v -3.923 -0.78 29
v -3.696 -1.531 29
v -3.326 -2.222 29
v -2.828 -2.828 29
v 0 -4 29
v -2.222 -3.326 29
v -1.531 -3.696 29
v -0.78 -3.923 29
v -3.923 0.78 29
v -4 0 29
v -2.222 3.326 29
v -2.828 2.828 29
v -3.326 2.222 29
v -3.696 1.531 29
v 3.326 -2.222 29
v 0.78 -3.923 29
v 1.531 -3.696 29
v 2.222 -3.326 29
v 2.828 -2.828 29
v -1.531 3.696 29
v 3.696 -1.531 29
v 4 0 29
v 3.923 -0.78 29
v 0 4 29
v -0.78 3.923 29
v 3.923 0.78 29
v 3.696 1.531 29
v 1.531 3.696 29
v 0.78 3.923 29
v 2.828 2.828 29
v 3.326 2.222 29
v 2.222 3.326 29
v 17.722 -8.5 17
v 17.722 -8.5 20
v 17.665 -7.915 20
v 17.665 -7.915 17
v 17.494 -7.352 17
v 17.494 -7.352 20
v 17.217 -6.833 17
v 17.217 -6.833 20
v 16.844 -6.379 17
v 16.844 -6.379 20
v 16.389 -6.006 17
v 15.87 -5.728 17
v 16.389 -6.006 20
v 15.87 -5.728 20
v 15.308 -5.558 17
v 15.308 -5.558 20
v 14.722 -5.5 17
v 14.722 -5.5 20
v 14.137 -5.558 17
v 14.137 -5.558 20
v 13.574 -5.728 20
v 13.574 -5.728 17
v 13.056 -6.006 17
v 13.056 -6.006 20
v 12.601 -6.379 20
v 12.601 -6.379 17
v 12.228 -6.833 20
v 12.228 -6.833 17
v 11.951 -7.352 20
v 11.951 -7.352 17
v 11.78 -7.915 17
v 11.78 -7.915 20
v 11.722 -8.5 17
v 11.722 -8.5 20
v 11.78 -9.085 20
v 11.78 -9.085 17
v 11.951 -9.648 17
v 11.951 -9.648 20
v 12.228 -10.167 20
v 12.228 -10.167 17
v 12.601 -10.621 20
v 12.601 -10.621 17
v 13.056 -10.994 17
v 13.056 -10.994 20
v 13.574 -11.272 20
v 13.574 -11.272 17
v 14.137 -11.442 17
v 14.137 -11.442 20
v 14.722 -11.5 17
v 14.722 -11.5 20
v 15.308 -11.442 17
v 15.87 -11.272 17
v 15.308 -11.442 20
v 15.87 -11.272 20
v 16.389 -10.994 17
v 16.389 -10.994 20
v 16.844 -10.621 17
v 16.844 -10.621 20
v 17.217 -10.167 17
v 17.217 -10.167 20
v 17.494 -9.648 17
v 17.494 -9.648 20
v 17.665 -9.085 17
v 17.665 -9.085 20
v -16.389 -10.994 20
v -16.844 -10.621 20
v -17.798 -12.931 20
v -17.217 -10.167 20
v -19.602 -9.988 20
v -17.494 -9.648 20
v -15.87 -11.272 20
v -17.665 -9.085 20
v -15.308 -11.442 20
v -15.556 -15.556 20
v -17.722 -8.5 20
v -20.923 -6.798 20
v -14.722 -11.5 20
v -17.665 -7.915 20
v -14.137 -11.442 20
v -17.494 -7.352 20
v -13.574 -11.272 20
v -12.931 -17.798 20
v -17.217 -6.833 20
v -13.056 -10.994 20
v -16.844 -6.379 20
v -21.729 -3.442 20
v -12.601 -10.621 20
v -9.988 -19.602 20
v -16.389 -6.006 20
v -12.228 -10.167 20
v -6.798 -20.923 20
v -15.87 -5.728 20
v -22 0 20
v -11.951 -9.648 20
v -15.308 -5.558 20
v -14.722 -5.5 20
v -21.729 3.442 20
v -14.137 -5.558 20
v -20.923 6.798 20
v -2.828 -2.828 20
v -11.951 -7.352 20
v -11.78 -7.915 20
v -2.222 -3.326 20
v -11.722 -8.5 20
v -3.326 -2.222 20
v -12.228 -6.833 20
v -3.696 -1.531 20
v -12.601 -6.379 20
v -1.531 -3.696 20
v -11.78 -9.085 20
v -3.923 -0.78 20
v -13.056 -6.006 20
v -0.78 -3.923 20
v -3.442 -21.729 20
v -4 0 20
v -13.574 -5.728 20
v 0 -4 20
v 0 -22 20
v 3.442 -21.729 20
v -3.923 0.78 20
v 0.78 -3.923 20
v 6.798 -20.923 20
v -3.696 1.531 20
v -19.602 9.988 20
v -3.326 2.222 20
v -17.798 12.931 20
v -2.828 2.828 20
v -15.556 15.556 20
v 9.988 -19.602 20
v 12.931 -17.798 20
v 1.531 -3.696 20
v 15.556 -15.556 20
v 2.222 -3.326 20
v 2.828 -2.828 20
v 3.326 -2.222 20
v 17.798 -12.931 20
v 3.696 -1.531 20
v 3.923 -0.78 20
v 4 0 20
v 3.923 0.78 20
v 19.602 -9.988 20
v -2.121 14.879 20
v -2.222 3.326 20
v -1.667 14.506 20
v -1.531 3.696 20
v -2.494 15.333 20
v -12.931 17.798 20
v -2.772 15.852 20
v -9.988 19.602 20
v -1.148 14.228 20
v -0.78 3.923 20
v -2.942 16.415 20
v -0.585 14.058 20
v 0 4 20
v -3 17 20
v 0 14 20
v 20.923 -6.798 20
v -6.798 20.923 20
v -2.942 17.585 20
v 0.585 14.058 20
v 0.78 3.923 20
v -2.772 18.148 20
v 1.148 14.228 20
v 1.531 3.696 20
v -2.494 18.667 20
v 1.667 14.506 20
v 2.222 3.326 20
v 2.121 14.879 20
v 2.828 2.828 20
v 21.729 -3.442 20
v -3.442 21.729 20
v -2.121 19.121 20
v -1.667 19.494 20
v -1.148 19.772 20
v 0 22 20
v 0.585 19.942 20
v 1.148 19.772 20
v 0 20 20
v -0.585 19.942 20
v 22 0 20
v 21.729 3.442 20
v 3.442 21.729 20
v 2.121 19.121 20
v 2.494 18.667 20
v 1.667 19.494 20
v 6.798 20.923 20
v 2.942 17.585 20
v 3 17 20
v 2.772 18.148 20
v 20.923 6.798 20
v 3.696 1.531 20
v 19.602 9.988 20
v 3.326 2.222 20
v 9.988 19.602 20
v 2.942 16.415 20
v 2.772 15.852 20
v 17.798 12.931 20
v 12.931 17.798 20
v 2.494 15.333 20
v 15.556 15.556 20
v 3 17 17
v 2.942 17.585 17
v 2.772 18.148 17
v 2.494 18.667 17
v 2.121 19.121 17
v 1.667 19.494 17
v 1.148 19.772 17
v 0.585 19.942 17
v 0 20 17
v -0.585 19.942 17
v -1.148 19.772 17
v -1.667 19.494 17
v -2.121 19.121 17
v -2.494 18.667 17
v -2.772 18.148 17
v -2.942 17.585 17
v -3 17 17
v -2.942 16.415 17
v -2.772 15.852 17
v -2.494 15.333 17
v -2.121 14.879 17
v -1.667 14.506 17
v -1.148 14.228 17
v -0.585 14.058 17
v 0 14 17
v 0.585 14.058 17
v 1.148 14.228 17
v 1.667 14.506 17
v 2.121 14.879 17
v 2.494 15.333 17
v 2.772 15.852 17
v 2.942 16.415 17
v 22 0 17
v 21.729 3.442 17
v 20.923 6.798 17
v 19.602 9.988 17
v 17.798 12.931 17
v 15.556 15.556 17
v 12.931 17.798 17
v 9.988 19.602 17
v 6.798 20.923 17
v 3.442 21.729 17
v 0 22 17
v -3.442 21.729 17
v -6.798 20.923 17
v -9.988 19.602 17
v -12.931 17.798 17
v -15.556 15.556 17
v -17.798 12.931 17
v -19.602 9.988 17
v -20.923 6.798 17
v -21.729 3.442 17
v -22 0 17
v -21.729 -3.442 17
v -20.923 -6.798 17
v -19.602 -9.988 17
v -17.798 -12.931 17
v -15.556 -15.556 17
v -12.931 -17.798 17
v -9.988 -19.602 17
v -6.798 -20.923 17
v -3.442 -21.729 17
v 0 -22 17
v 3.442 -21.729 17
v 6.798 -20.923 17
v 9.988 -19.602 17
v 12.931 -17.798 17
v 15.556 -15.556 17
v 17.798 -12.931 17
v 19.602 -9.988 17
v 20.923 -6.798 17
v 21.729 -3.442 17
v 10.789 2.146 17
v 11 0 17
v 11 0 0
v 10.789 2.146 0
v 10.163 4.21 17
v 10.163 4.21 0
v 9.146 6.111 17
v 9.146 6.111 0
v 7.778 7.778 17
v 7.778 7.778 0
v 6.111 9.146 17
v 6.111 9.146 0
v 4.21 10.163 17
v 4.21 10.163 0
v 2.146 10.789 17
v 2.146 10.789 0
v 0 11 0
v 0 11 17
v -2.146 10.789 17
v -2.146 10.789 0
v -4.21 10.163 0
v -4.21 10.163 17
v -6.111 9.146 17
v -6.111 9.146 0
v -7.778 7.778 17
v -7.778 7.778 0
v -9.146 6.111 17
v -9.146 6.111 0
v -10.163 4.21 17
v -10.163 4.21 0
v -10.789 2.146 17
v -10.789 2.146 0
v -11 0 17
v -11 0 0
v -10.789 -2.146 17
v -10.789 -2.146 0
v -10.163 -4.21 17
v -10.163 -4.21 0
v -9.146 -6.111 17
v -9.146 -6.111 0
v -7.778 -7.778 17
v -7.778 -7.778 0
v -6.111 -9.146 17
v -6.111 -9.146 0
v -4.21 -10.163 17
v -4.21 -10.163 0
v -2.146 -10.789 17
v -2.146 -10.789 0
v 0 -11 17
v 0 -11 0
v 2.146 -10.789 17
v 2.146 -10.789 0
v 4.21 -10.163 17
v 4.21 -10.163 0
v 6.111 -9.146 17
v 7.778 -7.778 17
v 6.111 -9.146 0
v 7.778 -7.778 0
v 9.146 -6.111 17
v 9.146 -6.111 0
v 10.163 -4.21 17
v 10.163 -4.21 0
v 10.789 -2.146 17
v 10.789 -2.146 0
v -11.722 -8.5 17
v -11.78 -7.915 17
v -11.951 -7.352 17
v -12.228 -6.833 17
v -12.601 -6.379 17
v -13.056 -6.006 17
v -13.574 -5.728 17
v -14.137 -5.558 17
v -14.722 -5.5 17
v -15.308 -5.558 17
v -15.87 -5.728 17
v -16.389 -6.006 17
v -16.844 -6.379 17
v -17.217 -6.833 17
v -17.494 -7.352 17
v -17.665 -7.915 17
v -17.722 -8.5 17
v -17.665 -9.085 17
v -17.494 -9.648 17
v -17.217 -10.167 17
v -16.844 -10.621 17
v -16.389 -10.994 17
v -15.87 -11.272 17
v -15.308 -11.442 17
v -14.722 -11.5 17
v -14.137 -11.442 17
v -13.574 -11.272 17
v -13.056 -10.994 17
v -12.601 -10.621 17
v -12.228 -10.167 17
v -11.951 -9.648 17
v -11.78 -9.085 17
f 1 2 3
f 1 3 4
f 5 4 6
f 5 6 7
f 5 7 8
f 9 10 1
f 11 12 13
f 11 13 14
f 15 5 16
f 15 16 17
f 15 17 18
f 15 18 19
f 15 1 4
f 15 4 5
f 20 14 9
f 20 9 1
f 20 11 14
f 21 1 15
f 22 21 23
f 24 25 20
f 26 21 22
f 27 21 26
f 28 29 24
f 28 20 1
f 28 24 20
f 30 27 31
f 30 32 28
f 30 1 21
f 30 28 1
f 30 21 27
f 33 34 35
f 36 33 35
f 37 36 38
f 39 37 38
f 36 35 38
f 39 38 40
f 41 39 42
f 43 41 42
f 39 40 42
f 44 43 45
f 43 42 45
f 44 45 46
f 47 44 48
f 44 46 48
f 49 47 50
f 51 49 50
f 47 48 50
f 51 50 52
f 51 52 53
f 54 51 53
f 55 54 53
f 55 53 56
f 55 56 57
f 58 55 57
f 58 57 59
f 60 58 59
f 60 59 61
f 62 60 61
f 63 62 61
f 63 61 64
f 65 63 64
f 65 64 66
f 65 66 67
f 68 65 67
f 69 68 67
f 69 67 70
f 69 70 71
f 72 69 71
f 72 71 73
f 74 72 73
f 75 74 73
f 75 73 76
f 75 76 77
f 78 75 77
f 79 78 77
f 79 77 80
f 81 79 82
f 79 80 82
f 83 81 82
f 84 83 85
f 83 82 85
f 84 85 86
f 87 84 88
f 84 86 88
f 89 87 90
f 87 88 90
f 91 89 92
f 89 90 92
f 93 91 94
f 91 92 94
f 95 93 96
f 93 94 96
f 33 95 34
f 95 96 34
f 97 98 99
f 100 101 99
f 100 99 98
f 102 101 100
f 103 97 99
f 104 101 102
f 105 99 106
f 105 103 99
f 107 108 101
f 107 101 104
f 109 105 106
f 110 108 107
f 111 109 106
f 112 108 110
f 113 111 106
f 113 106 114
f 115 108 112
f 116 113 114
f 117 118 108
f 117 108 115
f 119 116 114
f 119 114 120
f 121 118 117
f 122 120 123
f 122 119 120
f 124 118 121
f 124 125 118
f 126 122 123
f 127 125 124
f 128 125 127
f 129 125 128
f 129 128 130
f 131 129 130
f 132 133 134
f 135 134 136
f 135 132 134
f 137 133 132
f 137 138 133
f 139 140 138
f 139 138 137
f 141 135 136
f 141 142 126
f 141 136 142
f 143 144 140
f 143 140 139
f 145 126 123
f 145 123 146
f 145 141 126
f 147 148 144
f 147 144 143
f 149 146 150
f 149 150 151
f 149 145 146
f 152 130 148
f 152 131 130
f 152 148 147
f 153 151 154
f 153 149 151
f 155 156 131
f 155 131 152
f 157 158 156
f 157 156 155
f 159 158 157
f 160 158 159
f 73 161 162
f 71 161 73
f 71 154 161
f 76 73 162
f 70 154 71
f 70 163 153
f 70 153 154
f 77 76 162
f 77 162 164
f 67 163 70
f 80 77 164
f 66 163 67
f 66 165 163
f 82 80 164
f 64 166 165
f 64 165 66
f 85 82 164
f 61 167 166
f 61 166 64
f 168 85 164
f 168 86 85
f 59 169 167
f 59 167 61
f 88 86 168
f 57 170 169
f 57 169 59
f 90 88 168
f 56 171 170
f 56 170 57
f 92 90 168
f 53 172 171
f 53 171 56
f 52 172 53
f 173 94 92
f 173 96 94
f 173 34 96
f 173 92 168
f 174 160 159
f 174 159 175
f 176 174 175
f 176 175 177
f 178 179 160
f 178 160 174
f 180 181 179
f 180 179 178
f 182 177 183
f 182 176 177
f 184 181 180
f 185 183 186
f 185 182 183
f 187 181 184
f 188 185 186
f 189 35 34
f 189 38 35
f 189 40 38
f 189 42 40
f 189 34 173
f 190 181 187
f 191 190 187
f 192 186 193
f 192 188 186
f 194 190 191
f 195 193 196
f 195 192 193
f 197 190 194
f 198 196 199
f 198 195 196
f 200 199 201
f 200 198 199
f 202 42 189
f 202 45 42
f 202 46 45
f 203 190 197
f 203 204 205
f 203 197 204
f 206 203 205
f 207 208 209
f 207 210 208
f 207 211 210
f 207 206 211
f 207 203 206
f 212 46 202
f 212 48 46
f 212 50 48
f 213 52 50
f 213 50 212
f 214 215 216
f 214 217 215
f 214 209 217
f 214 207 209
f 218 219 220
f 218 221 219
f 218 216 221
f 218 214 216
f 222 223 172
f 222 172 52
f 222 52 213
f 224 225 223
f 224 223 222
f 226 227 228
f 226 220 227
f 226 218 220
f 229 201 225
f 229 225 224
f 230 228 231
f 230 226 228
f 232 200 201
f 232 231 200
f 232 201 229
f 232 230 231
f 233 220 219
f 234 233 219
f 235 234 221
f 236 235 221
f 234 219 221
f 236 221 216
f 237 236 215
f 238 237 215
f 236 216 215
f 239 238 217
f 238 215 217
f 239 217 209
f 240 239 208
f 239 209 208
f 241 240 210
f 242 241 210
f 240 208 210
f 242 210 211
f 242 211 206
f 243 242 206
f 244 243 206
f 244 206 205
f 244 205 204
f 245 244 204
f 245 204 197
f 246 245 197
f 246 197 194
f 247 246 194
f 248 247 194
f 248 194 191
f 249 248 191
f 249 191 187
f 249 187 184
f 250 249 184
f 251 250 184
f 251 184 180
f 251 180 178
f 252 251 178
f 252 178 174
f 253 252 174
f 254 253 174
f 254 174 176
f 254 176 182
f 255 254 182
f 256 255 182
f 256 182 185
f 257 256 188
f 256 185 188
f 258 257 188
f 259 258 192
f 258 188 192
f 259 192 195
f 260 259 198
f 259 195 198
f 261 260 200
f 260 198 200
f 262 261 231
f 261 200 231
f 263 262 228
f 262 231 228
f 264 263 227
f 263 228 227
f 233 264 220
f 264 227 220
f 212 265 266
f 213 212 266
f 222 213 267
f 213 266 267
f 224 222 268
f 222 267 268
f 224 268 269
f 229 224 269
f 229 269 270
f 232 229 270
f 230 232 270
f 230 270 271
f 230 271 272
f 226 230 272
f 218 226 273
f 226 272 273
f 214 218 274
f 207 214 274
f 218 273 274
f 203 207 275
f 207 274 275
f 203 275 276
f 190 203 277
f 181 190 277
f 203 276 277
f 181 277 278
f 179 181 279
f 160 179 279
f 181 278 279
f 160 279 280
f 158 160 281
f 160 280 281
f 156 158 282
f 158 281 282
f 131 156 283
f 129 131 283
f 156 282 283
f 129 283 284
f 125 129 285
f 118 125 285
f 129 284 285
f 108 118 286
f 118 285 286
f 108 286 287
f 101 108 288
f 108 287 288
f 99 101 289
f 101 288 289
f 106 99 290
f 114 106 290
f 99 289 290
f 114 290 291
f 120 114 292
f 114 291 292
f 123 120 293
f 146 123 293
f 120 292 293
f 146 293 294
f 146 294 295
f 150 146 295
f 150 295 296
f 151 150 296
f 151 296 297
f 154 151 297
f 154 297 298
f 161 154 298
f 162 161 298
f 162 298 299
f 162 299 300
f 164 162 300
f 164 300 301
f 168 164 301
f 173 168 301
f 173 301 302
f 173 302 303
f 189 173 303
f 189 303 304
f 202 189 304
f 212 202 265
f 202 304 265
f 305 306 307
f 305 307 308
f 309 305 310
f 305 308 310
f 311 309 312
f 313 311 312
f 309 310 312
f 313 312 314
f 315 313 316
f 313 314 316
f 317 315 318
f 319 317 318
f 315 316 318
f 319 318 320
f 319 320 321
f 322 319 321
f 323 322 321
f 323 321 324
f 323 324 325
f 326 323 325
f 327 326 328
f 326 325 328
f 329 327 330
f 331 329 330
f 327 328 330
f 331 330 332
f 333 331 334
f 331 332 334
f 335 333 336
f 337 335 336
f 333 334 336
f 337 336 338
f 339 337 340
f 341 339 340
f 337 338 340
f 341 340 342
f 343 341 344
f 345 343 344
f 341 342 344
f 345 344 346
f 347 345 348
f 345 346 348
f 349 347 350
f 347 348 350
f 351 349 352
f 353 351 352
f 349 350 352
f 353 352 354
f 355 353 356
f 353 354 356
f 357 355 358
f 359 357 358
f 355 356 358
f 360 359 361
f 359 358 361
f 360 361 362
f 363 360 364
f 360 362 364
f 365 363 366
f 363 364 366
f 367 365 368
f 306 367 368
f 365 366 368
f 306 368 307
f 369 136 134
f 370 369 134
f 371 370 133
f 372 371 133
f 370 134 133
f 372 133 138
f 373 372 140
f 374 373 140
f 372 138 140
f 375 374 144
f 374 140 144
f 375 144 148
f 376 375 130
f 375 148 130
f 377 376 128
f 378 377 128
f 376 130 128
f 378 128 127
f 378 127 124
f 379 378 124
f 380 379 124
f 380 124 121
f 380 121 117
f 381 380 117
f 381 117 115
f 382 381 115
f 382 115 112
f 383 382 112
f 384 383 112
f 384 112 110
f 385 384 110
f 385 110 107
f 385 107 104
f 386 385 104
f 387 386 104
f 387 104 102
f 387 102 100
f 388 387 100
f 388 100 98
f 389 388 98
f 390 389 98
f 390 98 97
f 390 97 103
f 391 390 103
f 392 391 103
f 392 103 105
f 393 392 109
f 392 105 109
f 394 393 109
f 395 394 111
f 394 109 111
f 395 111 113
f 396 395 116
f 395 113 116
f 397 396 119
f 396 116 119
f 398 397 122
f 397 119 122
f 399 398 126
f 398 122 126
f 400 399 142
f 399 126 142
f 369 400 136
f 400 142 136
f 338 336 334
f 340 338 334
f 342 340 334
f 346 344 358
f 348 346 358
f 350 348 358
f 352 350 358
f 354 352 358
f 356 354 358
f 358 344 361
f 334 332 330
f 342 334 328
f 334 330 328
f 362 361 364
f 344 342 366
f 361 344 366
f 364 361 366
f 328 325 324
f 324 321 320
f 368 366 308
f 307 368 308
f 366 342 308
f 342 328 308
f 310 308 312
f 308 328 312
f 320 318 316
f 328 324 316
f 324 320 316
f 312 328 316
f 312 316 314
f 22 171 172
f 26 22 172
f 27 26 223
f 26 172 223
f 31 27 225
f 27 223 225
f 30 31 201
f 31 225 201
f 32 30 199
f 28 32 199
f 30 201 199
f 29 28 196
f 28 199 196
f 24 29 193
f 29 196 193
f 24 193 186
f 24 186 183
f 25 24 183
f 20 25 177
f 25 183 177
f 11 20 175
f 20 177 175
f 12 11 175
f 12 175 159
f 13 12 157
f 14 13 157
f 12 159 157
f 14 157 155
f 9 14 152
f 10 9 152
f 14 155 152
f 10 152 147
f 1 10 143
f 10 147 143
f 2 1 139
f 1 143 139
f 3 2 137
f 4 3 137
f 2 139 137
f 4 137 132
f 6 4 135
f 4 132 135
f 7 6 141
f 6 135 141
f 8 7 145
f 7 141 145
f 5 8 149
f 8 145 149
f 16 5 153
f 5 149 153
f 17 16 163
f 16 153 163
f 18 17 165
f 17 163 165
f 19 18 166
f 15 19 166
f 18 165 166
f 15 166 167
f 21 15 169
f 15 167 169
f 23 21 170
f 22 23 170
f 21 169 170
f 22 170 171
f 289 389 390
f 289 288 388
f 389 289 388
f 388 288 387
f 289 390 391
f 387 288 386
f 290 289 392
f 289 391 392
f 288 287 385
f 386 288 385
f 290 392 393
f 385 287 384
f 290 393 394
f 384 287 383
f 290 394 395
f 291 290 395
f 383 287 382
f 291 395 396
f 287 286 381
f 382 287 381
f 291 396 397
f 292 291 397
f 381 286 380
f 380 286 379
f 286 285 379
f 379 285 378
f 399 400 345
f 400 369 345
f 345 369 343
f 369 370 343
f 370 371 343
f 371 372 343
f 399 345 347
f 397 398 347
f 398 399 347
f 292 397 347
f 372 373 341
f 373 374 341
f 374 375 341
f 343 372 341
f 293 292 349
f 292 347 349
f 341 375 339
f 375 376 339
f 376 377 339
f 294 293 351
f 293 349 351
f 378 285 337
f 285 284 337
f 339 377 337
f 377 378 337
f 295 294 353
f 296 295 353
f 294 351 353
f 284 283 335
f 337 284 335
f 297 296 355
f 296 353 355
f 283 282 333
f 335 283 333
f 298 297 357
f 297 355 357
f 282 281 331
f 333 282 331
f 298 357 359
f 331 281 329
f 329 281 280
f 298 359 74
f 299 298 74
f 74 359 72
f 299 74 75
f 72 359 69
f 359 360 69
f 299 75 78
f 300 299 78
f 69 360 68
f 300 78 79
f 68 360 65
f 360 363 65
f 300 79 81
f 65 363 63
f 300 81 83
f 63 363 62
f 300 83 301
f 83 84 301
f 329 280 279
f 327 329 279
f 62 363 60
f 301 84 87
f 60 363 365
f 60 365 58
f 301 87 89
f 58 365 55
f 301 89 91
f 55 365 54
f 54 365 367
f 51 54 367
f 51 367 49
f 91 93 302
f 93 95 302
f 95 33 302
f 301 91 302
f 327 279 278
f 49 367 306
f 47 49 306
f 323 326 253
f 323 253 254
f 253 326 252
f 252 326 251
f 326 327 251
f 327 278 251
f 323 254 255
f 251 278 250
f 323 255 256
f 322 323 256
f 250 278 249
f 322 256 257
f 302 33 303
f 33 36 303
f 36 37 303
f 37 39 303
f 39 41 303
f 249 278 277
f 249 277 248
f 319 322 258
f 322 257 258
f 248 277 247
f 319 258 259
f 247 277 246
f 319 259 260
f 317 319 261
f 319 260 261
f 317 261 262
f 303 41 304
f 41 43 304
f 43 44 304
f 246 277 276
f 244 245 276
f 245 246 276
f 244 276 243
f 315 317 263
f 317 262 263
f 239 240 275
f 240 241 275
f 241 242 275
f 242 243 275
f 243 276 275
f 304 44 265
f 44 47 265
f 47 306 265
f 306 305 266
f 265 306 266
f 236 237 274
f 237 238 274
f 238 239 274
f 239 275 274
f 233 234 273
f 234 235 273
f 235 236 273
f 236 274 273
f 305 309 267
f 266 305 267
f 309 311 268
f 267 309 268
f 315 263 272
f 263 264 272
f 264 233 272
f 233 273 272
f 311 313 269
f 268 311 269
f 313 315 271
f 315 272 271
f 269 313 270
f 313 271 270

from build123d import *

# Parameters (mm, degrees)
ESQUISSE1_R             = 11
BOSS_EXTRU_1_DEPTH      = 17
ESQUISSE2_R             = 22
BOSS_EXTRU_2_DEPTH      = 3
ESQUISSE3_R             = 4
BOSS_EXTRU_3_DEPTH      = 9
ENL_V_MAT_EXTRU_1_REACH = 38.986
ESQUISSE5_R             = 3


with BuildPart() as part:
    # Esquisse1 → Boss.-Extru.1 (new body)
    with BuildSketch(Plane.XY):
        Circle(ESQUISSE1_R)
    extrude(amount=BOSS_EXTRU_1_DEPTH)

    # Esquisse2 → Boss.-Extru.2 (add)
    with BuildSketch(Plane.XY.offset(17)):
        Circle(ESQUISSE2_R)
    extrude(amount=BOSS_EXTRU_2_DEPTH)

    # Esquisse3 → Boss.-Extru.3 (add)
    with BuildSketch(Plane.XY.offset(20)):
        Circle(ESQUISSE3_R)
    extrude(amount=BOSS_EXTRU_3_DEPTH)

    # Esquisse5 → Enlèv. mat.-Extru.1 (cut, up to next)
    with BuildSketch(Plane.XY.offset(20), mode=Mode.PRIVATE) as enl_v_mat_extru_1_sk1:
        with Locations((0, 17)):
            Circle(ESQUISSE5_R)
    enl_v_mat_extru_1_tool1 = extrude(enl_v_mat_extru_1_sk1.sketch, amount=-ENL_V_MAT_EXTRU_1_REACH, mode=Mode.PRIVATE) & part.part
    # Esquisse5 → Enlèv. mat.-Extru.1 (cut, up to next)
    with BuildSketch(Plane.XY.offset(20), mode=Mode.PRIVATE) as enl_v_mat_extru_1_sk2:
        with Locations((14.722431864, -8.5)):
            Circle(ESQUISSE5_R)
    enl_v_mat_extru_1_tool2 = extrude(enl_v_mat_extru_1_sk2.sketch, amount=-ENL_V_MAT_EXTRU_1_REACH, mode=Mode.PRIVATE) & part.part
    # Esquisse5 → Enlèv. mat.-Extru.1 (cut, up to next)
    with BuildSketch(Plane.XY.offset(20), mode=Mode.PRIVATE) as enl_v_mat_extru_1_sk3:
        with Locations((-14.722431864, -8.5)):
            Circle(ESQUISSE5_R)
    enl_v_mat_extru_1_tool3 = extrude(enl_v_mat_extru_1_sk3.sketch, amount=-ENL_V_MAT_EXTRU_1_REACH, mode=Mode.PRIVATE) & part.part
    add(enl_v_mat_extru_1_tool1.solids().sort_by_distance((0, 17, 20))[0], mode=Mode.SUBTRACT)
    add(enl_v_mat_extru_1_tool2.solids().sort_by_distance((14.722432, -8.5, 20))[0], mode=Mode.SUBTRACT)
    add(enl_v_mat_extru_1_tool3.solids().sort_by_distance((-14.722432, -8.5, 20))[0], mode=Mode.SUBTRACT)


solid = part.part
